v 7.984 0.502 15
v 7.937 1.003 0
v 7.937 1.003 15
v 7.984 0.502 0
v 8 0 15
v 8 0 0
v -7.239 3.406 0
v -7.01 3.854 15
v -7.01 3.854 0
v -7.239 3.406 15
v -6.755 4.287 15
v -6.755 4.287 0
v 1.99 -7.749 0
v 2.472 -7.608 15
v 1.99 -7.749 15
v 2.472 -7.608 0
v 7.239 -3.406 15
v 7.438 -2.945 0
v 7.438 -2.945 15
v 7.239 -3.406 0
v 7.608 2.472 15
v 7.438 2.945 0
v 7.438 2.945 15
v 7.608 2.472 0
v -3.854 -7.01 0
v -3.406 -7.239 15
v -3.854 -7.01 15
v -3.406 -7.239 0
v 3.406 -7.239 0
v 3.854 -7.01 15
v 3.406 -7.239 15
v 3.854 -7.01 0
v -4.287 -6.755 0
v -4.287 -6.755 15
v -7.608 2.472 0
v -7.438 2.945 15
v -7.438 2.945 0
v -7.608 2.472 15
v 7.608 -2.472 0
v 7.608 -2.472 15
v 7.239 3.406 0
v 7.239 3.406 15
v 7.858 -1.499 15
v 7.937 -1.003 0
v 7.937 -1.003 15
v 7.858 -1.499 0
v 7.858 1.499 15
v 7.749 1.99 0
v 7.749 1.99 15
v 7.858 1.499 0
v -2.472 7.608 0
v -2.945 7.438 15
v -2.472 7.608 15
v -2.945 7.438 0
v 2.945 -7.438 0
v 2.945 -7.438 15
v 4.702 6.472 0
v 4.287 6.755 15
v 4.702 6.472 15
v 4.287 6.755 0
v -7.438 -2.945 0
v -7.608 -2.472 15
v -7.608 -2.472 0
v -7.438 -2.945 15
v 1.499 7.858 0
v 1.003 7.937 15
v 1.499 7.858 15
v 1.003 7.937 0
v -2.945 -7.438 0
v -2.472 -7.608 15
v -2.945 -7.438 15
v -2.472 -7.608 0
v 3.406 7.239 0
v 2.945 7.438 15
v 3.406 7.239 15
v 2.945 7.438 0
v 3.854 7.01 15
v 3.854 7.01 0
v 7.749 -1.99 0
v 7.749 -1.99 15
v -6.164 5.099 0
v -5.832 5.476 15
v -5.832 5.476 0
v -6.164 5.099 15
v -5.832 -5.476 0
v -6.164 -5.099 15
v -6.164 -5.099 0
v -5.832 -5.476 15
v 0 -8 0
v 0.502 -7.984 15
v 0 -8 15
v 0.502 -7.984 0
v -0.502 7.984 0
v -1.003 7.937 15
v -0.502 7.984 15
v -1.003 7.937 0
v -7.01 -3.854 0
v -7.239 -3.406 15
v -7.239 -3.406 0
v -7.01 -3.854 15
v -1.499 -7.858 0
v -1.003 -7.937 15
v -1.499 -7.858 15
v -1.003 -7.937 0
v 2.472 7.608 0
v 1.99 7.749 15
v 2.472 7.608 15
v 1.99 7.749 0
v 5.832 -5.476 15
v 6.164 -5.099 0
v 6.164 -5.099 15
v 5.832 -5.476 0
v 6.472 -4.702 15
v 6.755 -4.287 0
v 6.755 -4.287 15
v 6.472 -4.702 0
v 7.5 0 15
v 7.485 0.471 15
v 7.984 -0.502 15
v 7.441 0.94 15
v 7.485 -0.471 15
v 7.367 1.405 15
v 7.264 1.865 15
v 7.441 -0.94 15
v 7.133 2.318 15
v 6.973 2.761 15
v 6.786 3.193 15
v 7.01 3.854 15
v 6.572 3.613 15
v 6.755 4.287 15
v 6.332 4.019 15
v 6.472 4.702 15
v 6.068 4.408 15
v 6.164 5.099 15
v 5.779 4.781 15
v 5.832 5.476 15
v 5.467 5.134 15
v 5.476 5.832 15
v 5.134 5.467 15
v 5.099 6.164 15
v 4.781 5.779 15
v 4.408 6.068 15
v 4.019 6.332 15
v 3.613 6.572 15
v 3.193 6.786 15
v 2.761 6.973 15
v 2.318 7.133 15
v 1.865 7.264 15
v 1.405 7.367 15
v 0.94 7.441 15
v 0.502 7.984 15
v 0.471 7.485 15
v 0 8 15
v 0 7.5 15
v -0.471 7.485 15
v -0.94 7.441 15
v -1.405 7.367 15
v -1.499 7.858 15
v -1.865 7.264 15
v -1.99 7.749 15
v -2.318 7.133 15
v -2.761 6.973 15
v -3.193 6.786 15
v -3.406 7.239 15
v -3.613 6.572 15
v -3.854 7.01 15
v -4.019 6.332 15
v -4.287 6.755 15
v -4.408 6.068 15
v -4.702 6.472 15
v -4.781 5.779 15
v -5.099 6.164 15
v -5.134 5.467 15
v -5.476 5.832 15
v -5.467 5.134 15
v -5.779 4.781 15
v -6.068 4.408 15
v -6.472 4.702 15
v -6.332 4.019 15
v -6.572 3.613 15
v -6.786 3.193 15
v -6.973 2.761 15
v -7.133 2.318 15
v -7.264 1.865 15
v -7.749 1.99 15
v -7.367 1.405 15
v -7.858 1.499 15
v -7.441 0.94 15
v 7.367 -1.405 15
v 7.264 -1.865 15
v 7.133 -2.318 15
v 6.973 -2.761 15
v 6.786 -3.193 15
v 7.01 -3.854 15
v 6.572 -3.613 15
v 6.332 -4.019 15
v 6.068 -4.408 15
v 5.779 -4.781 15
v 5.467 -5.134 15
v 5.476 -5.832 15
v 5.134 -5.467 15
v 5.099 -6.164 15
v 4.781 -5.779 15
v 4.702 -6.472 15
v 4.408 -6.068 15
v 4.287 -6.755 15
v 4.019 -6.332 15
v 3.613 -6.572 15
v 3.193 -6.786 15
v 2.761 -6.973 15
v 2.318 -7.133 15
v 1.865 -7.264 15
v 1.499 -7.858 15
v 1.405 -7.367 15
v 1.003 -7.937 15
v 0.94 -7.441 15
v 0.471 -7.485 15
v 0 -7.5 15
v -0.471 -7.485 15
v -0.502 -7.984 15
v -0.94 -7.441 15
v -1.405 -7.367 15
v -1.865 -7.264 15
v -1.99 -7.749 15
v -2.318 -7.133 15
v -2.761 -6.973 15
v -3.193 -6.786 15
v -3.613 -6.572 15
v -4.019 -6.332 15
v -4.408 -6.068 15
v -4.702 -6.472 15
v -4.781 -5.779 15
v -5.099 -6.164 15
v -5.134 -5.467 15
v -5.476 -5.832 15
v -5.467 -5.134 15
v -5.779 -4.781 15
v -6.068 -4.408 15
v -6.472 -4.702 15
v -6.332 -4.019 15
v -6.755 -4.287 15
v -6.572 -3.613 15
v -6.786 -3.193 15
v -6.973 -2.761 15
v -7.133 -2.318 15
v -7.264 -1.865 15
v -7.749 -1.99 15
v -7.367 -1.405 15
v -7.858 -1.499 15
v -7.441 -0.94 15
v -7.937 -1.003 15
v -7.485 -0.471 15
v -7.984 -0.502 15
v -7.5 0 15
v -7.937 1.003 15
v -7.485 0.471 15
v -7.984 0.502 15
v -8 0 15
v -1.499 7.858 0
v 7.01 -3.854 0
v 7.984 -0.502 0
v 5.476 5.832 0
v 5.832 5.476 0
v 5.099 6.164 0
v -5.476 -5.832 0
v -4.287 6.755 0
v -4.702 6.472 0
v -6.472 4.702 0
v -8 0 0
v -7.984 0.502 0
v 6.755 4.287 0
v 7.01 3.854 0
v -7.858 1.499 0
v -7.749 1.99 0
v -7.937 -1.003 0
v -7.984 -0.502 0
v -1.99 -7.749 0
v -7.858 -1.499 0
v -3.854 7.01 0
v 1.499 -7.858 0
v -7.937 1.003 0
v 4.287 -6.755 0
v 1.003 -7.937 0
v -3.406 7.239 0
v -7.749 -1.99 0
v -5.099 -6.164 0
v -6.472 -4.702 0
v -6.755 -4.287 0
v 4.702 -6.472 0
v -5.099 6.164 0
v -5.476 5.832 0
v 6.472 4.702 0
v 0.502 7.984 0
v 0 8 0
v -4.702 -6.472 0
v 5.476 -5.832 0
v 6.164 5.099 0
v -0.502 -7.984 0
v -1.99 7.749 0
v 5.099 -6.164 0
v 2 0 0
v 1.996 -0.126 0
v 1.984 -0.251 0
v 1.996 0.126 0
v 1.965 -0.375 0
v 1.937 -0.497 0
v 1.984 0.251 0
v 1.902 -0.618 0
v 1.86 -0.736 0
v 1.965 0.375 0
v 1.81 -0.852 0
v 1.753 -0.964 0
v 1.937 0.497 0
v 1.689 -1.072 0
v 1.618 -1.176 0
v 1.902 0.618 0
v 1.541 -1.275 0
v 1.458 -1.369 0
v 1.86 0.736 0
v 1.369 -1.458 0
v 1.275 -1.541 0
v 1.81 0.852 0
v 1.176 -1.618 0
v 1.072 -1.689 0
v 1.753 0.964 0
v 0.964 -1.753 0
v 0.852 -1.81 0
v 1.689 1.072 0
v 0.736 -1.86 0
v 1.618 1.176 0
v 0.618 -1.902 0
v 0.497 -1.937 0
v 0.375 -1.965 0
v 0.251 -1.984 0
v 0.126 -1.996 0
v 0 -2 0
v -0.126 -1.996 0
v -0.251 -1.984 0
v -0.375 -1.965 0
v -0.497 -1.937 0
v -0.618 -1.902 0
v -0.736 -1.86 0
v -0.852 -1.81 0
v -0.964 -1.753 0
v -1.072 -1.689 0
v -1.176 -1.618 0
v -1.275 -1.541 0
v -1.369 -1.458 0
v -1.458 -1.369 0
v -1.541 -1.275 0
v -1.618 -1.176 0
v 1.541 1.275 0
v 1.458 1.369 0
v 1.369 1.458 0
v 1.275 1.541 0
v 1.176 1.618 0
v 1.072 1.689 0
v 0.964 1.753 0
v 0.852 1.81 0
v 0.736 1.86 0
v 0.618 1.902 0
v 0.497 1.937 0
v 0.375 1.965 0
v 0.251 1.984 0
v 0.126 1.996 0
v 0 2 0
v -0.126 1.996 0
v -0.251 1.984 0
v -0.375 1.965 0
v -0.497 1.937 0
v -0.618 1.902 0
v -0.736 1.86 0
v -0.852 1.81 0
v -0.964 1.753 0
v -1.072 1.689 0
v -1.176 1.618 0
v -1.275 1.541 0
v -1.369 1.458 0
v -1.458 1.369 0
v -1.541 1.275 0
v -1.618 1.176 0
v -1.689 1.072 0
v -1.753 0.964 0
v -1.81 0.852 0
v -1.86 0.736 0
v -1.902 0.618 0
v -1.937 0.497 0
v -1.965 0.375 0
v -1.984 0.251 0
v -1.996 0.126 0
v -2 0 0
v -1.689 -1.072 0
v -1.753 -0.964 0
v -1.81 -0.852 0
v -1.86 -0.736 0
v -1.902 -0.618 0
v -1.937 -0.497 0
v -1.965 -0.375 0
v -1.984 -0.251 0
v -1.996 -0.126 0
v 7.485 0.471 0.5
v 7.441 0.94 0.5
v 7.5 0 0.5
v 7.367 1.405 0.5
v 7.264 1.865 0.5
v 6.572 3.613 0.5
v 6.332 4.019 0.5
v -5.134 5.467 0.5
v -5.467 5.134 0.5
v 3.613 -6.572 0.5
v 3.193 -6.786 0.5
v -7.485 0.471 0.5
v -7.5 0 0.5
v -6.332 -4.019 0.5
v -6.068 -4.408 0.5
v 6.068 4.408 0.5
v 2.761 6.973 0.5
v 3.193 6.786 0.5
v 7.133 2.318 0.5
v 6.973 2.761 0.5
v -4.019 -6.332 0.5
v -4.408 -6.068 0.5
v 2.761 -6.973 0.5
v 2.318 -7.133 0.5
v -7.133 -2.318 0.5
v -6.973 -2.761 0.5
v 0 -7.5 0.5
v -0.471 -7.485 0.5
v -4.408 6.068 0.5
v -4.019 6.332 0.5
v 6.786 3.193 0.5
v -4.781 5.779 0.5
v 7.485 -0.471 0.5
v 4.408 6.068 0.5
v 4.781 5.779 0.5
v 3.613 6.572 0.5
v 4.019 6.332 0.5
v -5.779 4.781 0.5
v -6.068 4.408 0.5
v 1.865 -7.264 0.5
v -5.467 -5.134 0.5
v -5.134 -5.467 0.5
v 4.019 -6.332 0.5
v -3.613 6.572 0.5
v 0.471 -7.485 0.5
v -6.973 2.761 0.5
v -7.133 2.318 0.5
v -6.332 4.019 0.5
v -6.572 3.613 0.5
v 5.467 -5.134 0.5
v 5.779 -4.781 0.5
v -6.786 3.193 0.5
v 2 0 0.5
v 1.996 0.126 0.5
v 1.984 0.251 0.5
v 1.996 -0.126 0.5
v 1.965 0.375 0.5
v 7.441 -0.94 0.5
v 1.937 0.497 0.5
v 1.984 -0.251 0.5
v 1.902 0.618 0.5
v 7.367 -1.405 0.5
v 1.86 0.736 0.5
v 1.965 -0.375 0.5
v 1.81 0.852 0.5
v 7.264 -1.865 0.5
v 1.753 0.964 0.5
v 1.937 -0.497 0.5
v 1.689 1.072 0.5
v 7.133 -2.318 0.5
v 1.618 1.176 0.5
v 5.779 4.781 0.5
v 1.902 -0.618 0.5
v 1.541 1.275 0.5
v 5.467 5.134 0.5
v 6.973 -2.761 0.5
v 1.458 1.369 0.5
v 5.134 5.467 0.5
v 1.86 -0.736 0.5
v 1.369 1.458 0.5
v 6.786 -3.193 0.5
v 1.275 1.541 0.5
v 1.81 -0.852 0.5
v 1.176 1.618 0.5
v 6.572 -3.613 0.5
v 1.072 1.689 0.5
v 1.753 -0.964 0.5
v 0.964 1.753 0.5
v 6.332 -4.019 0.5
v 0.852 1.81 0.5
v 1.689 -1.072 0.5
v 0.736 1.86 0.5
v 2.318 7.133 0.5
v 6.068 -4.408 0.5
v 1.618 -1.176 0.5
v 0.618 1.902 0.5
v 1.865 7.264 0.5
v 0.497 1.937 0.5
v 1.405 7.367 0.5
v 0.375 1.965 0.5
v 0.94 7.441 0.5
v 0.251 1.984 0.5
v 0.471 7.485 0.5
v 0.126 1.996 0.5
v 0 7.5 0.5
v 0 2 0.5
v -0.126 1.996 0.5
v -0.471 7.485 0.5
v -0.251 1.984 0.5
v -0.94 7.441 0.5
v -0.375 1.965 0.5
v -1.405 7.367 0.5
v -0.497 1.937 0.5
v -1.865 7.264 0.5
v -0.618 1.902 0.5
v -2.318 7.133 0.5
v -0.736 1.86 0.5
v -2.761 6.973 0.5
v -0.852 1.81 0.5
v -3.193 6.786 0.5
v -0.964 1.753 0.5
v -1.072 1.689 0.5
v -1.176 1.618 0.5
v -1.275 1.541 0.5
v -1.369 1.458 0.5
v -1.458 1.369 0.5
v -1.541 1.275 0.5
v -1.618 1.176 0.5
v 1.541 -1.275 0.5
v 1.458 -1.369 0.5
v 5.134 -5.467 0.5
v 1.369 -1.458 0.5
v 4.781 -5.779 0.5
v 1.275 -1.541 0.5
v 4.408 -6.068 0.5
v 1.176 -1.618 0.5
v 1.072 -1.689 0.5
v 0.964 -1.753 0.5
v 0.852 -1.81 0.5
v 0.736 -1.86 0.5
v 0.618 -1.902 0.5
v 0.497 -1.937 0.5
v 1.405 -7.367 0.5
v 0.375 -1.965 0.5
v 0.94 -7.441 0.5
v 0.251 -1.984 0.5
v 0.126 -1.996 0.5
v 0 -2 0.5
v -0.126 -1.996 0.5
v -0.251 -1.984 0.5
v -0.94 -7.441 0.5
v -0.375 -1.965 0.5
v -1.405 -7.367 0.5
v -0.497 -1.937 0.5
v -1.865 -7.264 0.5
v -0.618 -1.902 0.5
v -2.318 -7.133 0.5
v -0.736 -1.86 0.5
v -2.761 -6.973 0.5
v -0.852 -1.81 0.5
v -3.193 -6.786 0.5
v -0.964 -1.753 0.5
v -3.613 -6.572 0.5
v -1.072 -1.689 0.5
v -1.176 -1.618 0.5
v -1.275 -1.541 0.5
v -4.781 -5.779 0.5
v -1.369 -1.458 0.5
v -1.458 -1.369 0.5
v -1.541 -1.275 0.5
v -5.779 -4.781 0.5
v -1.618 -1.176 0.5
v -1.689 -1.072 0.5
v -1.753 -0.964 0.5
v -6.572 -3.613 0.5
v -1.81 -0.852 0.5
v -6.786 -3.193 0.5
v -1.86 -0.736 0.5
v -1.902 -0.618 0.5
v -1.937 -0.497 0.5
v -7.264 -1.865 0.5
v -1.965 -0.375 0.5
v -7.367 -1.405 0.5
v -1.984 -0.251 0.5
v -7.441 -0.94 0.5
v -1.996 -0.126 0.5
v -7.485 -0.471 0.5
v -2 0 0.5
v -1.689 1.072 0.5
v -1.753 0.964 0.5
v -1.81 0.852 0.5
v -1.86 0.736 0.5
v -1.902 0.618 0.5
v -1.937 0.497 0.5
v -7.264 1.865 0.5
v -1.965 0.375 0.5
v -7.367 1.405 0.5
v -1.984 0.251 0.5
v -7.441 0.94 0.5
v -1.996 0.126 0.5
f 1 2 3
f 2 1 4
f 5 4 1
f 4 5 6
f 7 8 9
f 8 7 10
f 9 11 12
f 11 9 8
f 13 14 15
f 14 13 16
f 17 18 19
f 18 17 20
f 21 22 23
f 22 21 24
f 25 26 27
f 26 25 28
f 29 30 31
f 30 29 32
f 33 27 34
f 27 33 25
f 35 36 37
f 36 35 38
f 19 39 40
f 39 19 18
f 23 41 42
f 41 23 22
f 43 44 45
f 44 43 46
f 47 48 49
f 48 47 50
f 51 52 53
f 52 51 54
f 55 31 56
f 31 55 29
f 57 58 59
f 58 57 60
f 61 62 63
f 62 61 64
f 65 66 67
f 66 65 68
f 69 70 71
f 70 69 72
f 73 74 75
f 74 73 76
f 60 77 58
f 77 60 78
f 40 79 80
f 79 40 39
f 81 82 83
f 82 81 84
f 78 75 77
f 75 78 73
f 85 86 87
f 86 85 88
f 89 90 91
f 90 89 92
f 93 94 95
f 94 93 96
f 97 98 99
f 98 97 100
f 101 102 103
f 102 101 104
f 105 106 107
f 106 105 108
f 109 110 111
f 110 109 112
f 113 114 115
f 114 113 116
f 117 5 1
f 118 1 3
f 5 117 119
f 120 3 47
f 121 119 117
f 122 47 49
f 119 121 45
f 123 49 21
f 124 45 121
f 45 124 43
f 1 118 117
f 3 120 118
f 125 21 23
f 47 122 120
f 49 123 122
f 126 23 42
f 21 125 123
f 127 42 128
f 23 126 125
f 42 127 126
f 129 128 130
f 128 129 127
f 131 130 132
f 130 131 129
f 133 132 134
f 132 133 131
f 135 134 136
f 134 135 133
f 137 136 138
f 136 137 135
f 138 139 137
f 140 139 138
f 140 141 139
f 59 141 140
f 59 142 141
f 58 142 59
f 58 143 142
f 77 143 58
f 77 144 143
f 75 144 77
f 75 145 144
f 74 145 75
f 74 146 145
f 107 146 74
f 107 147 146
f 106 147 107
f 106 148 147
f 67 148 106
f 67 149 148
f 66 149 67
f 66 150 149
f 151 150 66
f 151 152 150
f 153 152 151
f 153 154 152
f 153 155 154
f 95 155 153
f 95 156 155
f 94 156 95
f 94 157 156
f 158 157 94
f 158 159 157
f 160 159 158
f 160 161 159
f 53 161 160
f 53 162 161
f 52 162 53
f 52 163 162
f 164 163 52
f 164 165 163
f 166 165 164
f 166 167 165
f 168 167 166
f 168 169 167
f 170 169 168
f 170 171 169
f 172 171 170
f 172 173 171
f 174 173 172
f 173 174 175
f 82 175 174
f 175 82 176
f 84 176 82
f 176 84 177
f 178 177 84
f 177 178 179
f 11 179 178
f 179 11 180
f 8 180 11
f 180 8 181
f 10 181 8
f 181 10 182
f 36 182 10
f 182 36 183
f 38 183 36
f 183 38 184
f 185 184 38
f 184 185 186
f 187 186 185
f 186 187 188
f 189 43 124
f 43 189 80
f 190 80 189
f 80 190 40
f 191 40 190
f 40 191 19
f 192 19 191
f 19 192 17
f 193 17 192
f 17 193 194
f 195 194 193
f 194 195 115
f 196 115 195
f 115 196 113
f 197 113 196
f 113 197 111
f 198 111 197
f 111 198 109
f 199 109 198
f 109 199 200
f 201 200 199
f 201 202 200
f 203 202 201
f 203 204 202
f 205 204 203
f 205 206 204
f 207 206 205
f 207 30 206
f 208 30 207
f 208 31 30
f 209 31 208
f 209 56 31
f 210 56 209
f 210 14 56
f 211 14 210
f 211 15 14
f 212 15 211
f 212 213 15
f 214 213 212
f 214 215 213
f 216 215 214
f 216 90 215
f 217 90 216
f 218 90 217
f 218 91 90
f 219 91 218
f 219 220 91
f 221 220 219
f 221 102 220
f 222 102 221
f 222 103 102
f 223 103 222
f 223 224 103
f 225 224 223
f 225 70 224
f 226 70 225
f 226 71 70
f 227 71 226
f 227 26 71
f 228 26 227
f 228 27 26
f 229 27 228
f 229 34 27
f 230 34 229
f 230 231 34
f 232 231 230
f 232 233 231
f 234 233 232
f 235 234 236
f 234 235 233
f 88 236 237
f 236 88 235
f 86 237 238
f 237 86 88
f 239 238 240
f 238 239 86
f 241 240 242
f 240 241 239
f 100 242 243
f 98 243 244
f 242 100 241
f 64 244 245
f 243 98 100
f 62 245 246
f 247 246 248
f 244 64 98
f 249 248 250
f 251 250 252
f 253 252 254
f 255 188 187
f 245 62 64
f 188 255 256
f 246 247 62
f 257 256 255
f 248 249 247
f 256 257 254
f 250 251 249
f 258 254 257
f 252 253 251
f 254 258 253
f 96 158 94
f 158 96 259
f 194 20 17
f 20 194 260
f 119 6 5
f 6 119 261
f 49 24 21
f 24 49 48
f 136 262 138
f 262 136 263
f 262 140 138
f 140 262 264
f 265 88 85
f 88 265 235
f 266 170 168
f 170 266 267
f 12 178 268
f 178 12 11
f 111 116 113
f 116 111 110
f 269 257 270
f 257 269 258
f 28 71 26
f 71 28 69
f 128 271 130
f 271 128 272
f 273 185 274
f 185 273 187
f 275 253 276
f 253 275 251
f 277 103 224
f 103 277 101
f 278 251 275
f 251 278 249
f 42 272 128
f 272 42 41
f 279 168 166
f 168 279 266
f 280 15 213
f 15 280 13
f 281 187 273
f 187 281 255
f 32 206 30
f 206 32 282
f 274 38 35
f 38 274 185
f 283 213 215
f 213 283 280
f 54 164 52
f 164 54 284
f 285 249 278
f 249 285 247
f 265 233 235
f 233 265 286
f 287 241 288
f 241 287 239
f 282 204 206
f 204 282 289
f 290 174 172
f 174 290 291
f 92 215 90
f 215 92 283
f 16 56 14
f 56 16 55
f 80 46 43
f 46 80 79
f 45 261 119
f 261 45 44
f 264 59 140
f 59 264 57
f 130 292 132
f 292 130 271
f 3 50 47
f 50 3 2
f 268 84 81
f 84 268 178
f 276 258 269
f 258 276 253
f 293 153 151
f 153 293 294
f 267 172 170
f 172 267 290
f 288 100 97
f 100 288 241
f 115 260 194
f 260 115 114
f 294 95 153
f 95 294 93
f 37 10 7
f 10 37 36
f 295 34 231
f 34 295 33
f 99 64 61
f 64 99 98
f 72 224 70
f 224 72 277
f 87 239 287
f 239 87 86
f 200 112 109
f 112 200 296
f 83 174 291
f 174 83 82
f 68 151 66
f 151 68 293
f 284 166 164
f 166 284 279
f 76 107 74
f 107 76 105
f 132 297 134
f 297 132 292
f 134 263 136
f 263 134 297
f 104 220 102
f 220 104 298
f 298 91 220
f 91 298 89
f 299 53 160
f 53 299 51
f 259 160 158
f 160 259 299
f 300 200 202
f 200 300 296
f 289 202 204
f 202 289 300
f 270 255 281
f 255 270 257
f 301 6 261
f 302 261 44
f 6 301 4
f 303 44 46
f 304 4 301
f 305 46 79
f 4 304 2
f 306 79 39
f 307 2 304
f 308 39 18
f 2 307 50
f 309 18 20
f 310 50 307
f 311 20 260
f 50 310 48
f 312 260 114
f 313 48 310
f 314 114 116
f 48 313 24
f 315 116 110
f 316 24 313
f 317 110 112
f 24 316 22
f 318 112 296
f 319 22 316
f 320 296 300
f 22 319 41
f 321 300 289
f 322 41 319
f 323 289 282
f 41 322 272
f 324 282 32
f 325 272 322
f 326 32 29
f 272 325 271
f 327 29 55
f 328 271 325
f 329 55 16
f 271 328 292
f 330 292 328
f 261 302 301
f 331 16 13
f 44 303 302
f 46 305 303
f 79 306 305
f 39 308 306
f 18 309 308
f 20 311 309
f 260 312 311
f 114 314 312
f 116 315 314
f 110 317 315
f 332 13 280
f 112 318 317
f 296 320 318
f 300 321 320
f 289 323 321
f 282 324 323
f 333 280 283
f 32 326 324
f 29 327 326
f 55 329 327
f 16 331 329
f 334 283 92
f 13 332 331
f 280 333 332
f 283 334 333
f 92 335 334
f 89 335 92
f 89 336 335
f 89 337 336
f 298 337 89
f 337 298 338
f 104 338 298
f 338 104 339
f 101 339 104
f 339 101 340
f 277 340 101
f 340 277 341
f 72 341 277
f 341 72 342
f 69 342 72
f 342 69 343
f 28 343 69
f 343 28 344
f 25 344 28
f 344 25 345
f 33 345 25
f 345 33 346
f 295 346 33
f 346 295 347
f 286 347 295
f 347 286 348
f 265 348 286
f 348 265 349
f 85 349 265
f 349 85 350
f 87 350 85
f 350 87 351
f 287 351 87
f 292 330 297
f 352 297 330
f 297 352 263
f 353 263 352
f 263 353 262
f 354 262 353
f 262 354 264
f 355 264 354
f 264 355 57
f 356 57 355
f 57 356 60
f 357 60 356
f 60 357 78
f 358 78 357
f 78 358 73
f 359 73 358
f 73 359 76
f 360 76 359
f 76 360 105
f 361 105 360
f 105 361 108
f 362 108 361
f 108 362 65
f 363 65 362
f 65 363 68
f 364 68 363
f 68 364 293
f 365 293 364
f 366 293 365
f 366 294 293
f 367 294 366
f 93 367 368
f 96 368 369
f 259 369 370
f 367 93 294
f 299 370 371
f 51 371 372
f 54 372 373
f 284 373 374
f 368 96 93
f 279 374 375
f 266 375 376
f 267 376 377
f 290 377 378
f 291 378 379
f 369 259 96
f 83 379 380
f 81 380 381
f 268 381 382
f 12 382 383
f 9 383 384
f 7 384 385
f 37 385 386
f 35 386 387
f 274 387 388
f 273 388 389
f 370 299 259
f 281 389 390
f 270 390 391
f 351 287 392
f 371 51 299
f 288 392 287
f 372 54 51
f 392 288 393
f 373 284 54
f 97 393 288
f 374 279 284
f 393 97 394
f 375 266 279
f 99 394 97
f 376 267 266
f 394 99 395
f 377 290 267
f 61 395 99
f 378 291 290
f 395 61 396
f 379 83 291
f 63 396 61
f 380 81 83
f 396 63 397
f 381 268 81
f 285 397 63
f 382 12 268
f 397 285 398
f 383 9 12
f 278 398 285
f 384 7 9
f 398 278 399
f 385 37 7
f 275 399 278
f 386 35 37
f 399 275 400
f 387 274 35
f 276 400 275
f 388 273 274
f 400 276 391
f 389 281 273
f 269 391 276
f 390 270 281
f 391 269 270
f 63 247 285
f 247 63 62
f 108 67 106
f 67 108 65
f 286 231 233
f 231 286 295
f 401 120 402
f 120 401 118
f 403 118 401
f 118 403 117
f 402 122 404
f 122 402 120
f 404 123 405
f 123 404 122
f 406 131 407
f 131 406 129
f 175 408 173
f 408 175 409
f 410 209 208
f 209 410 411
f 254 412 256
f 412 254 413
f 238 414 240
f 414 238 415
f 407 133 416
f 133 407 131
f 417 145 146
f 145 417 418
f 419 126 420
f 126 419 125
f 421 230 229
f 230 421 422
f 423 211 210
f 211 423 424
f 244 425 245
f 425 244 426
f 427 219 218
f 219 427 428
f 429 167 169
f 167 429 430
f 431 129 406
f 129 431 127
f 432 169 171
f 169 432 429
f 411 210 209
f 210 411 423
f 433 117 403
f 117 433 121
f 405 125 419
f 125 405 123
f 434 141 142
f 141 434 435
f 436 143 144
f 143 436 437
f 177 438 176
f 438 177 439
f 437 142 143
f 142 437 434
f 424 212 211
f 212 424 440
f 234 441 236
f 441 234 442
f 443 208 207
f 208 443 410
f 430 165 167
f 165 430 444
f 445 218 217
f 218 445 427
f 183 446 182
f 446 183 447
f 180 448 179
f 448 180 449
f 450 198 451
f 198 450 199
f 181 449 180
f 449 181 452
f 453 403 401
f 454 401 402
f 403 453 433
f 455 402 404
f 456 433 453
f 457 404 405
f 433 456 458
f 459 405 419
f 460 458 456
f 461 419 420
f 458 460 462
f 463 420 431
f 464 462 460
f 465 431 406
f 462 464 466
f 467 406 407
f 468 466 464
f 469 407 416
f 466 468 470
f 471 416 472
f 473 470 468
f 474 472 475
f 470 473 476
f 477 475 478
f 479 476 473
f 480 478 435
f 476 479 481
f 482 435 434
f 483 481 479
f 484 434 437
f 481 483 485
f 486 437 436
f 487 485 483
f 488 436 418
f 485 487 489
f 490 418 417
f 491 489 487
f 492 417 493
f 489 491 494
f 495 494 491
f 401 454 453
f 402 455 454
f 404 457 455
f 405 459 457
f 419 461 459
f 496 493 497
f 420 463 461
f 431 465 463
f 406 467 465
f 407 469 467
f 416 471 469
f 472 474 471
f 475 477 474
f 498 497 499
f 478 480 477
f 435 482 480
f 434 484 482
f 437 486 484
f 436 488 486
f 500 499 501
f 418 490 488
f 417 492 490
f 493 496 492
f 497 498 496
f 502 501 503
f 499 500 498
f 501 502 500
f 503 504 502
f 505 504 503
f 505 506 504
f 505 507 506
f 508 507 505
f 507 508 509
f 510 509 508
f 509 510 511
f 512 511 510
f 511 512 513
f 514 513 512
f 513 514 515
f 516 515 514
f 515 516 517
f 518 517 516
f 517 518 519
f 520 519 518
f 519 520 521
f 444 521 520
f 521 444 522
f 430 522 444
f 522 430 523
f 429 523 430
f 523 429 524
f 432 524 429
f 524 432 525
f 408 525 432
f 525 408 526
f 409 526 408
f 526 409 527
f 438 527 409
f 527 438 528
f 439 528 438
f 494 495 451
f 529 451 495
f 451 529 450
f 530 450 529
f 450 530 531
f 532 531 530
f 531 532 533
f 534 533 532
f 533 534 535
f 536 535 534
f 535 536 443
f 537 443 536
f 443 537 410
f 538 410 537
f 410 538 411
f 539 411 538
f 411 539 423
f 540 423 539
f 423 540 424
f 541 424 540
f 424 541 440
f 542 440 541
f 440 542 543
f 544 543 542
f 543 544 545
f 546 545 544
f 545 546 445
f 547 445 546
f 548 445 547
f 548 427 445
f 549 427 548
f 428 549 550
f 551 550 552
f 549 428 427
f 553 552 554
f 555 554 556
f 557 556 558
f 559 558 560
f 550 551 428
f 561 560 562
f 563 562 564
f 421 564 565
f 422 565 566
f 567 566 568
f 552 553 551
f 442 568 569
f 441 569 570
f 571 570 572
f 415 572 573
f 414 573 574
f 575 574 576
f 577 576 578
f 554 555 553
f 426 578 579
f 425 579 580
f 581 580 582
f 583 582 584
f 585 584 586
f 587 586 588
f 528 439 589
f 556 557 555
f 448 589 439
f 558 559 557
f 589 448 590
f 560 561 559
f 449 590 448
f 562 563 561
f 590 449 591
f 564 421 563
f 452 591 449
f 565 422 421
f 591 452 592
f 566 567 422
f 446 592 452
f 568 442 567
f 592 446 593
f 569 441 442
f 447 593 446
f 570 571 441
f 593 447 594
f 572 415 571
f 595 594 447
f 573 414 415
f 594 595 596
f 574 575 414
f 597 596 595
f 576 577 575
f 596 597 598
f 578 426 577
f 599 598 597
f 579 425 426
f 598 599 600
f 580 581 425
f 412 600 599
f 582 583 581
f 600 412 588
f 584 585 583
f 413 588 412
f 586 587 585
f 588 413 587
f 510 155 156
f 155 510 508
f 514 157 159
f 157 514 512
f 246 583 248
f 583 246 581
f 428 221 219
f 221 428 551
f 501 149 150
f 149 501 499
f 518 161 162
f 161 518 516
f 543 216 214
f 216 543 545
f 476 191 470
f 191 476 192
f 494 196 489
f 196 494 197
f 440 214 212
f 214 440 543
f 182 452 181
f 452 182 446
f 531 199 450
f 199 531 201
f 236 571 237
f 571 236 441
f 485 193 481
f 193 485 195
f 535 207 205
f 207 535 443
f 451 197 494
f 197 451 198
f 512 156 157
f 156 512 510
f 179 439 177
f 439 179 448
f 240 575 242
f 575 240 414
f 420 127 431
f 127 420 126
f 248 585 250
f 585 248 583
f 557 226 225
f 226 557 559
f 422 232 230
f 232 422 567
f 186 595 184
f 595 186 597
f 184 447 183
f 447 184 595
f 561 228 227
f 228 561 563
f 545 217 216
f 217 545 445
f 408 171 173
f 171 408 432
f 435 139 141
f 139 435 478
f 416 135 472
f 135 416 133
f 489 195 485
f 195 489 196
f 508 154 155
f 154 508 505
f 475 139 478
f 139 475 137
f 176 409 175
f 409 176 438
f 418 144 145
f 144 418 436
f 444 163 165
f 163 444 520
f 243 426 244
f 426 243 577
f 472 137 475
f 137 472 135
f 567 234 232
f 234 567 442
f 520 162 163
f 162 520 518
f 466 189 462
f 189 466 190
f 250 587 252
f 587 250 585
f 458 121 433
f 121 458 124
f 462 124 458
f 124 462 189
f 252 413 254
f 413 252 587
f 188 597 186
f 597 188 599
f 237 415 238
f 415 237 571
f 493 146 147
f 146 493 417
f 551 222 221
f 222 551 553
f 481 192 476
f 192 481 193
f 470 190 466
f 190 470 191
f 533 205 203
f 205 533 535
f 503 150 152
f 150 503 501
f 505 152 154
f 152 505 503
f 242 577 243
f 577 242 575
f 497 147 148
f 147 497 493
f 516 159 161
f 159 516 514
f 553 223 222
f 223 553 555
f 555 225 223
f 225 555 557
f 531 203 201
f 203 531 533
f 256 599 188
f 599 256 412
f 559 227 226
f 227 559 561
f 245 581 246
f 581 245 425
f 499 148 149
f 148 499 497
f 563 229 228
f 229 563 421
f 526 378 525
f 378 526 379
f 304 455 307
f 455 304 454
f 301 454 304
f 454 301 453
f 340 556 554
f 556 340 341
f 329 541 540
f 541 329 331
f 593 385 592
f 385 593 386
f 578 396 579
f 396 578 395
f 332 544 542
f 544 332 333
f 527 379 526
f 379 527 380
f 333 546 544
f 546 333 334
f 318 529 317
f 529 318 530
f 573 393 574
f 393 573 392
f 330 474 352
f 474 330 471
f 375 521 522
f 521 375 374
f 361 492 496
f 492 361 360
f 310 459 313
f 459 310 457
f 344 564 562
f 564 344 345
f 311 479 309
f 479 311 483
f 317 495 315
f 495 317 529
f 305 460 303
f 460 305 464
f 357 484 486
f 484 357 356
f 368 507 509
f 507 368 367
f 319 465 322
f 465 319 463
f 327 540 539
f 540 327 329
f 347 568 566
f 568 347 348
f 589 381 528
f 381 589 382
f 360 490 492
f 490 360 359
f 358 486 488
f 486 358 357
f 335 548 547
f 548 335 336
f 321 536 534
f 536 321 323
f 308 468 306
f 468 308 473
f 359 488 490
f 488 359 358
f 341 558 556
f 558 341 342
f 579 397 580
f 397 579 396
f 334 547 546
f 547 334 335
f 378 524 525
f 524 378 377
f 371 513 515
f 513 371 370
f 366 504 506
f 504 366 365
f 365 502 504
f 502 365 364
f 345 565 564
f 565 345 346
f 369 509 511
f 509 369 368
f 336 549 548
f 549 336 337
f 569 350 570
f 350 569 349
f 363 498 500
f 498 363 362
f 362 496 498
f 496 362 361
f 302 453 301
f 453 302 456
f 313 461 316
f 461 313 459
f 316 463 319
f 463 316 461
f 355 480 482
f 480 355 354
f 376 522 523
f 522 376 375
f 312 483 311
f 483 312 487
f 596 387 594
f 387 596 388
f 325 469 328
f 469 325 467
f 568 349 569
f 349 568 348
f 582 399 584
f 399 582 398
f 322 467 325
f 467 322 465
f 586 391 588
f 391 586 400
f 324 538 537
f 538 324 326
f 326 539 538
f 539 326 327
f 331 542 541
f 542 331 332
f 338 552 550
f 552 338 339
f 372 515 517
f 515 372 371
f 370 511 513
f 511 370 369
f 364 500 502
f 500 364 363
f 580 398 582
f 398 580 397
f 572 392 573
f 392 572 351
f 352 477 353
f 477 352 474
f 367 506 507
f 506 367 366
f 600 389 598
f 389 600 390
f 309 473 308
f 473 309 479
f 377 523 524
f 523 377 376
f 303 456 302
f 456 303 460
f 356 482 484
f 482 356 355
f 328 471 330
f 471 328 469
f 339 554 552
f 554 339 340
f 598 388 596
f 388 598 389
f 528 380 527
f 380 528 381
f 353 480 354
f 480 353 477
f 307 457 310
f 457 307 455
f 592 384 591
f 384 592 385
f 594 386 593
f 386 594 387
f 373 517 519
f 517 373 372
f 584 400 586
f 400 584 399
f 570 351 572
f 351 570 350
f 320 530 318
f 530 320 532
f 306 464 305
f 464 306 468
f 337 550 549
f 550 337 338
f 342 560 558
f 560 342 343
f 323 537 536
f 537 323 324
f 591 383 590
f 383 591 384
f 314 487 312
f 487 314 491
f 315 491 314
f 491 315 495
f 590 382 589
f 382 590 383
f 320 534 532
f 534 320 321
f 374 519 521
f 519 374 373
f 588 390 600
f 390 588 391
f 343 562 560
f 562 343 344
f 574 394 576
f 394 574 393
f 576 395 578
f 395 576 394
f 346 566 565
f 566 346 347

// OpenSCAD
difference() {
cylinder($fn = 100, 15, 8, 8);
translate([0,0,0.5])
cylinder($fn = 100, 15, 7.5, 7.5);
translate([0,0,-1])
cylinder($fn = 100, 15, 2, 2);
}
